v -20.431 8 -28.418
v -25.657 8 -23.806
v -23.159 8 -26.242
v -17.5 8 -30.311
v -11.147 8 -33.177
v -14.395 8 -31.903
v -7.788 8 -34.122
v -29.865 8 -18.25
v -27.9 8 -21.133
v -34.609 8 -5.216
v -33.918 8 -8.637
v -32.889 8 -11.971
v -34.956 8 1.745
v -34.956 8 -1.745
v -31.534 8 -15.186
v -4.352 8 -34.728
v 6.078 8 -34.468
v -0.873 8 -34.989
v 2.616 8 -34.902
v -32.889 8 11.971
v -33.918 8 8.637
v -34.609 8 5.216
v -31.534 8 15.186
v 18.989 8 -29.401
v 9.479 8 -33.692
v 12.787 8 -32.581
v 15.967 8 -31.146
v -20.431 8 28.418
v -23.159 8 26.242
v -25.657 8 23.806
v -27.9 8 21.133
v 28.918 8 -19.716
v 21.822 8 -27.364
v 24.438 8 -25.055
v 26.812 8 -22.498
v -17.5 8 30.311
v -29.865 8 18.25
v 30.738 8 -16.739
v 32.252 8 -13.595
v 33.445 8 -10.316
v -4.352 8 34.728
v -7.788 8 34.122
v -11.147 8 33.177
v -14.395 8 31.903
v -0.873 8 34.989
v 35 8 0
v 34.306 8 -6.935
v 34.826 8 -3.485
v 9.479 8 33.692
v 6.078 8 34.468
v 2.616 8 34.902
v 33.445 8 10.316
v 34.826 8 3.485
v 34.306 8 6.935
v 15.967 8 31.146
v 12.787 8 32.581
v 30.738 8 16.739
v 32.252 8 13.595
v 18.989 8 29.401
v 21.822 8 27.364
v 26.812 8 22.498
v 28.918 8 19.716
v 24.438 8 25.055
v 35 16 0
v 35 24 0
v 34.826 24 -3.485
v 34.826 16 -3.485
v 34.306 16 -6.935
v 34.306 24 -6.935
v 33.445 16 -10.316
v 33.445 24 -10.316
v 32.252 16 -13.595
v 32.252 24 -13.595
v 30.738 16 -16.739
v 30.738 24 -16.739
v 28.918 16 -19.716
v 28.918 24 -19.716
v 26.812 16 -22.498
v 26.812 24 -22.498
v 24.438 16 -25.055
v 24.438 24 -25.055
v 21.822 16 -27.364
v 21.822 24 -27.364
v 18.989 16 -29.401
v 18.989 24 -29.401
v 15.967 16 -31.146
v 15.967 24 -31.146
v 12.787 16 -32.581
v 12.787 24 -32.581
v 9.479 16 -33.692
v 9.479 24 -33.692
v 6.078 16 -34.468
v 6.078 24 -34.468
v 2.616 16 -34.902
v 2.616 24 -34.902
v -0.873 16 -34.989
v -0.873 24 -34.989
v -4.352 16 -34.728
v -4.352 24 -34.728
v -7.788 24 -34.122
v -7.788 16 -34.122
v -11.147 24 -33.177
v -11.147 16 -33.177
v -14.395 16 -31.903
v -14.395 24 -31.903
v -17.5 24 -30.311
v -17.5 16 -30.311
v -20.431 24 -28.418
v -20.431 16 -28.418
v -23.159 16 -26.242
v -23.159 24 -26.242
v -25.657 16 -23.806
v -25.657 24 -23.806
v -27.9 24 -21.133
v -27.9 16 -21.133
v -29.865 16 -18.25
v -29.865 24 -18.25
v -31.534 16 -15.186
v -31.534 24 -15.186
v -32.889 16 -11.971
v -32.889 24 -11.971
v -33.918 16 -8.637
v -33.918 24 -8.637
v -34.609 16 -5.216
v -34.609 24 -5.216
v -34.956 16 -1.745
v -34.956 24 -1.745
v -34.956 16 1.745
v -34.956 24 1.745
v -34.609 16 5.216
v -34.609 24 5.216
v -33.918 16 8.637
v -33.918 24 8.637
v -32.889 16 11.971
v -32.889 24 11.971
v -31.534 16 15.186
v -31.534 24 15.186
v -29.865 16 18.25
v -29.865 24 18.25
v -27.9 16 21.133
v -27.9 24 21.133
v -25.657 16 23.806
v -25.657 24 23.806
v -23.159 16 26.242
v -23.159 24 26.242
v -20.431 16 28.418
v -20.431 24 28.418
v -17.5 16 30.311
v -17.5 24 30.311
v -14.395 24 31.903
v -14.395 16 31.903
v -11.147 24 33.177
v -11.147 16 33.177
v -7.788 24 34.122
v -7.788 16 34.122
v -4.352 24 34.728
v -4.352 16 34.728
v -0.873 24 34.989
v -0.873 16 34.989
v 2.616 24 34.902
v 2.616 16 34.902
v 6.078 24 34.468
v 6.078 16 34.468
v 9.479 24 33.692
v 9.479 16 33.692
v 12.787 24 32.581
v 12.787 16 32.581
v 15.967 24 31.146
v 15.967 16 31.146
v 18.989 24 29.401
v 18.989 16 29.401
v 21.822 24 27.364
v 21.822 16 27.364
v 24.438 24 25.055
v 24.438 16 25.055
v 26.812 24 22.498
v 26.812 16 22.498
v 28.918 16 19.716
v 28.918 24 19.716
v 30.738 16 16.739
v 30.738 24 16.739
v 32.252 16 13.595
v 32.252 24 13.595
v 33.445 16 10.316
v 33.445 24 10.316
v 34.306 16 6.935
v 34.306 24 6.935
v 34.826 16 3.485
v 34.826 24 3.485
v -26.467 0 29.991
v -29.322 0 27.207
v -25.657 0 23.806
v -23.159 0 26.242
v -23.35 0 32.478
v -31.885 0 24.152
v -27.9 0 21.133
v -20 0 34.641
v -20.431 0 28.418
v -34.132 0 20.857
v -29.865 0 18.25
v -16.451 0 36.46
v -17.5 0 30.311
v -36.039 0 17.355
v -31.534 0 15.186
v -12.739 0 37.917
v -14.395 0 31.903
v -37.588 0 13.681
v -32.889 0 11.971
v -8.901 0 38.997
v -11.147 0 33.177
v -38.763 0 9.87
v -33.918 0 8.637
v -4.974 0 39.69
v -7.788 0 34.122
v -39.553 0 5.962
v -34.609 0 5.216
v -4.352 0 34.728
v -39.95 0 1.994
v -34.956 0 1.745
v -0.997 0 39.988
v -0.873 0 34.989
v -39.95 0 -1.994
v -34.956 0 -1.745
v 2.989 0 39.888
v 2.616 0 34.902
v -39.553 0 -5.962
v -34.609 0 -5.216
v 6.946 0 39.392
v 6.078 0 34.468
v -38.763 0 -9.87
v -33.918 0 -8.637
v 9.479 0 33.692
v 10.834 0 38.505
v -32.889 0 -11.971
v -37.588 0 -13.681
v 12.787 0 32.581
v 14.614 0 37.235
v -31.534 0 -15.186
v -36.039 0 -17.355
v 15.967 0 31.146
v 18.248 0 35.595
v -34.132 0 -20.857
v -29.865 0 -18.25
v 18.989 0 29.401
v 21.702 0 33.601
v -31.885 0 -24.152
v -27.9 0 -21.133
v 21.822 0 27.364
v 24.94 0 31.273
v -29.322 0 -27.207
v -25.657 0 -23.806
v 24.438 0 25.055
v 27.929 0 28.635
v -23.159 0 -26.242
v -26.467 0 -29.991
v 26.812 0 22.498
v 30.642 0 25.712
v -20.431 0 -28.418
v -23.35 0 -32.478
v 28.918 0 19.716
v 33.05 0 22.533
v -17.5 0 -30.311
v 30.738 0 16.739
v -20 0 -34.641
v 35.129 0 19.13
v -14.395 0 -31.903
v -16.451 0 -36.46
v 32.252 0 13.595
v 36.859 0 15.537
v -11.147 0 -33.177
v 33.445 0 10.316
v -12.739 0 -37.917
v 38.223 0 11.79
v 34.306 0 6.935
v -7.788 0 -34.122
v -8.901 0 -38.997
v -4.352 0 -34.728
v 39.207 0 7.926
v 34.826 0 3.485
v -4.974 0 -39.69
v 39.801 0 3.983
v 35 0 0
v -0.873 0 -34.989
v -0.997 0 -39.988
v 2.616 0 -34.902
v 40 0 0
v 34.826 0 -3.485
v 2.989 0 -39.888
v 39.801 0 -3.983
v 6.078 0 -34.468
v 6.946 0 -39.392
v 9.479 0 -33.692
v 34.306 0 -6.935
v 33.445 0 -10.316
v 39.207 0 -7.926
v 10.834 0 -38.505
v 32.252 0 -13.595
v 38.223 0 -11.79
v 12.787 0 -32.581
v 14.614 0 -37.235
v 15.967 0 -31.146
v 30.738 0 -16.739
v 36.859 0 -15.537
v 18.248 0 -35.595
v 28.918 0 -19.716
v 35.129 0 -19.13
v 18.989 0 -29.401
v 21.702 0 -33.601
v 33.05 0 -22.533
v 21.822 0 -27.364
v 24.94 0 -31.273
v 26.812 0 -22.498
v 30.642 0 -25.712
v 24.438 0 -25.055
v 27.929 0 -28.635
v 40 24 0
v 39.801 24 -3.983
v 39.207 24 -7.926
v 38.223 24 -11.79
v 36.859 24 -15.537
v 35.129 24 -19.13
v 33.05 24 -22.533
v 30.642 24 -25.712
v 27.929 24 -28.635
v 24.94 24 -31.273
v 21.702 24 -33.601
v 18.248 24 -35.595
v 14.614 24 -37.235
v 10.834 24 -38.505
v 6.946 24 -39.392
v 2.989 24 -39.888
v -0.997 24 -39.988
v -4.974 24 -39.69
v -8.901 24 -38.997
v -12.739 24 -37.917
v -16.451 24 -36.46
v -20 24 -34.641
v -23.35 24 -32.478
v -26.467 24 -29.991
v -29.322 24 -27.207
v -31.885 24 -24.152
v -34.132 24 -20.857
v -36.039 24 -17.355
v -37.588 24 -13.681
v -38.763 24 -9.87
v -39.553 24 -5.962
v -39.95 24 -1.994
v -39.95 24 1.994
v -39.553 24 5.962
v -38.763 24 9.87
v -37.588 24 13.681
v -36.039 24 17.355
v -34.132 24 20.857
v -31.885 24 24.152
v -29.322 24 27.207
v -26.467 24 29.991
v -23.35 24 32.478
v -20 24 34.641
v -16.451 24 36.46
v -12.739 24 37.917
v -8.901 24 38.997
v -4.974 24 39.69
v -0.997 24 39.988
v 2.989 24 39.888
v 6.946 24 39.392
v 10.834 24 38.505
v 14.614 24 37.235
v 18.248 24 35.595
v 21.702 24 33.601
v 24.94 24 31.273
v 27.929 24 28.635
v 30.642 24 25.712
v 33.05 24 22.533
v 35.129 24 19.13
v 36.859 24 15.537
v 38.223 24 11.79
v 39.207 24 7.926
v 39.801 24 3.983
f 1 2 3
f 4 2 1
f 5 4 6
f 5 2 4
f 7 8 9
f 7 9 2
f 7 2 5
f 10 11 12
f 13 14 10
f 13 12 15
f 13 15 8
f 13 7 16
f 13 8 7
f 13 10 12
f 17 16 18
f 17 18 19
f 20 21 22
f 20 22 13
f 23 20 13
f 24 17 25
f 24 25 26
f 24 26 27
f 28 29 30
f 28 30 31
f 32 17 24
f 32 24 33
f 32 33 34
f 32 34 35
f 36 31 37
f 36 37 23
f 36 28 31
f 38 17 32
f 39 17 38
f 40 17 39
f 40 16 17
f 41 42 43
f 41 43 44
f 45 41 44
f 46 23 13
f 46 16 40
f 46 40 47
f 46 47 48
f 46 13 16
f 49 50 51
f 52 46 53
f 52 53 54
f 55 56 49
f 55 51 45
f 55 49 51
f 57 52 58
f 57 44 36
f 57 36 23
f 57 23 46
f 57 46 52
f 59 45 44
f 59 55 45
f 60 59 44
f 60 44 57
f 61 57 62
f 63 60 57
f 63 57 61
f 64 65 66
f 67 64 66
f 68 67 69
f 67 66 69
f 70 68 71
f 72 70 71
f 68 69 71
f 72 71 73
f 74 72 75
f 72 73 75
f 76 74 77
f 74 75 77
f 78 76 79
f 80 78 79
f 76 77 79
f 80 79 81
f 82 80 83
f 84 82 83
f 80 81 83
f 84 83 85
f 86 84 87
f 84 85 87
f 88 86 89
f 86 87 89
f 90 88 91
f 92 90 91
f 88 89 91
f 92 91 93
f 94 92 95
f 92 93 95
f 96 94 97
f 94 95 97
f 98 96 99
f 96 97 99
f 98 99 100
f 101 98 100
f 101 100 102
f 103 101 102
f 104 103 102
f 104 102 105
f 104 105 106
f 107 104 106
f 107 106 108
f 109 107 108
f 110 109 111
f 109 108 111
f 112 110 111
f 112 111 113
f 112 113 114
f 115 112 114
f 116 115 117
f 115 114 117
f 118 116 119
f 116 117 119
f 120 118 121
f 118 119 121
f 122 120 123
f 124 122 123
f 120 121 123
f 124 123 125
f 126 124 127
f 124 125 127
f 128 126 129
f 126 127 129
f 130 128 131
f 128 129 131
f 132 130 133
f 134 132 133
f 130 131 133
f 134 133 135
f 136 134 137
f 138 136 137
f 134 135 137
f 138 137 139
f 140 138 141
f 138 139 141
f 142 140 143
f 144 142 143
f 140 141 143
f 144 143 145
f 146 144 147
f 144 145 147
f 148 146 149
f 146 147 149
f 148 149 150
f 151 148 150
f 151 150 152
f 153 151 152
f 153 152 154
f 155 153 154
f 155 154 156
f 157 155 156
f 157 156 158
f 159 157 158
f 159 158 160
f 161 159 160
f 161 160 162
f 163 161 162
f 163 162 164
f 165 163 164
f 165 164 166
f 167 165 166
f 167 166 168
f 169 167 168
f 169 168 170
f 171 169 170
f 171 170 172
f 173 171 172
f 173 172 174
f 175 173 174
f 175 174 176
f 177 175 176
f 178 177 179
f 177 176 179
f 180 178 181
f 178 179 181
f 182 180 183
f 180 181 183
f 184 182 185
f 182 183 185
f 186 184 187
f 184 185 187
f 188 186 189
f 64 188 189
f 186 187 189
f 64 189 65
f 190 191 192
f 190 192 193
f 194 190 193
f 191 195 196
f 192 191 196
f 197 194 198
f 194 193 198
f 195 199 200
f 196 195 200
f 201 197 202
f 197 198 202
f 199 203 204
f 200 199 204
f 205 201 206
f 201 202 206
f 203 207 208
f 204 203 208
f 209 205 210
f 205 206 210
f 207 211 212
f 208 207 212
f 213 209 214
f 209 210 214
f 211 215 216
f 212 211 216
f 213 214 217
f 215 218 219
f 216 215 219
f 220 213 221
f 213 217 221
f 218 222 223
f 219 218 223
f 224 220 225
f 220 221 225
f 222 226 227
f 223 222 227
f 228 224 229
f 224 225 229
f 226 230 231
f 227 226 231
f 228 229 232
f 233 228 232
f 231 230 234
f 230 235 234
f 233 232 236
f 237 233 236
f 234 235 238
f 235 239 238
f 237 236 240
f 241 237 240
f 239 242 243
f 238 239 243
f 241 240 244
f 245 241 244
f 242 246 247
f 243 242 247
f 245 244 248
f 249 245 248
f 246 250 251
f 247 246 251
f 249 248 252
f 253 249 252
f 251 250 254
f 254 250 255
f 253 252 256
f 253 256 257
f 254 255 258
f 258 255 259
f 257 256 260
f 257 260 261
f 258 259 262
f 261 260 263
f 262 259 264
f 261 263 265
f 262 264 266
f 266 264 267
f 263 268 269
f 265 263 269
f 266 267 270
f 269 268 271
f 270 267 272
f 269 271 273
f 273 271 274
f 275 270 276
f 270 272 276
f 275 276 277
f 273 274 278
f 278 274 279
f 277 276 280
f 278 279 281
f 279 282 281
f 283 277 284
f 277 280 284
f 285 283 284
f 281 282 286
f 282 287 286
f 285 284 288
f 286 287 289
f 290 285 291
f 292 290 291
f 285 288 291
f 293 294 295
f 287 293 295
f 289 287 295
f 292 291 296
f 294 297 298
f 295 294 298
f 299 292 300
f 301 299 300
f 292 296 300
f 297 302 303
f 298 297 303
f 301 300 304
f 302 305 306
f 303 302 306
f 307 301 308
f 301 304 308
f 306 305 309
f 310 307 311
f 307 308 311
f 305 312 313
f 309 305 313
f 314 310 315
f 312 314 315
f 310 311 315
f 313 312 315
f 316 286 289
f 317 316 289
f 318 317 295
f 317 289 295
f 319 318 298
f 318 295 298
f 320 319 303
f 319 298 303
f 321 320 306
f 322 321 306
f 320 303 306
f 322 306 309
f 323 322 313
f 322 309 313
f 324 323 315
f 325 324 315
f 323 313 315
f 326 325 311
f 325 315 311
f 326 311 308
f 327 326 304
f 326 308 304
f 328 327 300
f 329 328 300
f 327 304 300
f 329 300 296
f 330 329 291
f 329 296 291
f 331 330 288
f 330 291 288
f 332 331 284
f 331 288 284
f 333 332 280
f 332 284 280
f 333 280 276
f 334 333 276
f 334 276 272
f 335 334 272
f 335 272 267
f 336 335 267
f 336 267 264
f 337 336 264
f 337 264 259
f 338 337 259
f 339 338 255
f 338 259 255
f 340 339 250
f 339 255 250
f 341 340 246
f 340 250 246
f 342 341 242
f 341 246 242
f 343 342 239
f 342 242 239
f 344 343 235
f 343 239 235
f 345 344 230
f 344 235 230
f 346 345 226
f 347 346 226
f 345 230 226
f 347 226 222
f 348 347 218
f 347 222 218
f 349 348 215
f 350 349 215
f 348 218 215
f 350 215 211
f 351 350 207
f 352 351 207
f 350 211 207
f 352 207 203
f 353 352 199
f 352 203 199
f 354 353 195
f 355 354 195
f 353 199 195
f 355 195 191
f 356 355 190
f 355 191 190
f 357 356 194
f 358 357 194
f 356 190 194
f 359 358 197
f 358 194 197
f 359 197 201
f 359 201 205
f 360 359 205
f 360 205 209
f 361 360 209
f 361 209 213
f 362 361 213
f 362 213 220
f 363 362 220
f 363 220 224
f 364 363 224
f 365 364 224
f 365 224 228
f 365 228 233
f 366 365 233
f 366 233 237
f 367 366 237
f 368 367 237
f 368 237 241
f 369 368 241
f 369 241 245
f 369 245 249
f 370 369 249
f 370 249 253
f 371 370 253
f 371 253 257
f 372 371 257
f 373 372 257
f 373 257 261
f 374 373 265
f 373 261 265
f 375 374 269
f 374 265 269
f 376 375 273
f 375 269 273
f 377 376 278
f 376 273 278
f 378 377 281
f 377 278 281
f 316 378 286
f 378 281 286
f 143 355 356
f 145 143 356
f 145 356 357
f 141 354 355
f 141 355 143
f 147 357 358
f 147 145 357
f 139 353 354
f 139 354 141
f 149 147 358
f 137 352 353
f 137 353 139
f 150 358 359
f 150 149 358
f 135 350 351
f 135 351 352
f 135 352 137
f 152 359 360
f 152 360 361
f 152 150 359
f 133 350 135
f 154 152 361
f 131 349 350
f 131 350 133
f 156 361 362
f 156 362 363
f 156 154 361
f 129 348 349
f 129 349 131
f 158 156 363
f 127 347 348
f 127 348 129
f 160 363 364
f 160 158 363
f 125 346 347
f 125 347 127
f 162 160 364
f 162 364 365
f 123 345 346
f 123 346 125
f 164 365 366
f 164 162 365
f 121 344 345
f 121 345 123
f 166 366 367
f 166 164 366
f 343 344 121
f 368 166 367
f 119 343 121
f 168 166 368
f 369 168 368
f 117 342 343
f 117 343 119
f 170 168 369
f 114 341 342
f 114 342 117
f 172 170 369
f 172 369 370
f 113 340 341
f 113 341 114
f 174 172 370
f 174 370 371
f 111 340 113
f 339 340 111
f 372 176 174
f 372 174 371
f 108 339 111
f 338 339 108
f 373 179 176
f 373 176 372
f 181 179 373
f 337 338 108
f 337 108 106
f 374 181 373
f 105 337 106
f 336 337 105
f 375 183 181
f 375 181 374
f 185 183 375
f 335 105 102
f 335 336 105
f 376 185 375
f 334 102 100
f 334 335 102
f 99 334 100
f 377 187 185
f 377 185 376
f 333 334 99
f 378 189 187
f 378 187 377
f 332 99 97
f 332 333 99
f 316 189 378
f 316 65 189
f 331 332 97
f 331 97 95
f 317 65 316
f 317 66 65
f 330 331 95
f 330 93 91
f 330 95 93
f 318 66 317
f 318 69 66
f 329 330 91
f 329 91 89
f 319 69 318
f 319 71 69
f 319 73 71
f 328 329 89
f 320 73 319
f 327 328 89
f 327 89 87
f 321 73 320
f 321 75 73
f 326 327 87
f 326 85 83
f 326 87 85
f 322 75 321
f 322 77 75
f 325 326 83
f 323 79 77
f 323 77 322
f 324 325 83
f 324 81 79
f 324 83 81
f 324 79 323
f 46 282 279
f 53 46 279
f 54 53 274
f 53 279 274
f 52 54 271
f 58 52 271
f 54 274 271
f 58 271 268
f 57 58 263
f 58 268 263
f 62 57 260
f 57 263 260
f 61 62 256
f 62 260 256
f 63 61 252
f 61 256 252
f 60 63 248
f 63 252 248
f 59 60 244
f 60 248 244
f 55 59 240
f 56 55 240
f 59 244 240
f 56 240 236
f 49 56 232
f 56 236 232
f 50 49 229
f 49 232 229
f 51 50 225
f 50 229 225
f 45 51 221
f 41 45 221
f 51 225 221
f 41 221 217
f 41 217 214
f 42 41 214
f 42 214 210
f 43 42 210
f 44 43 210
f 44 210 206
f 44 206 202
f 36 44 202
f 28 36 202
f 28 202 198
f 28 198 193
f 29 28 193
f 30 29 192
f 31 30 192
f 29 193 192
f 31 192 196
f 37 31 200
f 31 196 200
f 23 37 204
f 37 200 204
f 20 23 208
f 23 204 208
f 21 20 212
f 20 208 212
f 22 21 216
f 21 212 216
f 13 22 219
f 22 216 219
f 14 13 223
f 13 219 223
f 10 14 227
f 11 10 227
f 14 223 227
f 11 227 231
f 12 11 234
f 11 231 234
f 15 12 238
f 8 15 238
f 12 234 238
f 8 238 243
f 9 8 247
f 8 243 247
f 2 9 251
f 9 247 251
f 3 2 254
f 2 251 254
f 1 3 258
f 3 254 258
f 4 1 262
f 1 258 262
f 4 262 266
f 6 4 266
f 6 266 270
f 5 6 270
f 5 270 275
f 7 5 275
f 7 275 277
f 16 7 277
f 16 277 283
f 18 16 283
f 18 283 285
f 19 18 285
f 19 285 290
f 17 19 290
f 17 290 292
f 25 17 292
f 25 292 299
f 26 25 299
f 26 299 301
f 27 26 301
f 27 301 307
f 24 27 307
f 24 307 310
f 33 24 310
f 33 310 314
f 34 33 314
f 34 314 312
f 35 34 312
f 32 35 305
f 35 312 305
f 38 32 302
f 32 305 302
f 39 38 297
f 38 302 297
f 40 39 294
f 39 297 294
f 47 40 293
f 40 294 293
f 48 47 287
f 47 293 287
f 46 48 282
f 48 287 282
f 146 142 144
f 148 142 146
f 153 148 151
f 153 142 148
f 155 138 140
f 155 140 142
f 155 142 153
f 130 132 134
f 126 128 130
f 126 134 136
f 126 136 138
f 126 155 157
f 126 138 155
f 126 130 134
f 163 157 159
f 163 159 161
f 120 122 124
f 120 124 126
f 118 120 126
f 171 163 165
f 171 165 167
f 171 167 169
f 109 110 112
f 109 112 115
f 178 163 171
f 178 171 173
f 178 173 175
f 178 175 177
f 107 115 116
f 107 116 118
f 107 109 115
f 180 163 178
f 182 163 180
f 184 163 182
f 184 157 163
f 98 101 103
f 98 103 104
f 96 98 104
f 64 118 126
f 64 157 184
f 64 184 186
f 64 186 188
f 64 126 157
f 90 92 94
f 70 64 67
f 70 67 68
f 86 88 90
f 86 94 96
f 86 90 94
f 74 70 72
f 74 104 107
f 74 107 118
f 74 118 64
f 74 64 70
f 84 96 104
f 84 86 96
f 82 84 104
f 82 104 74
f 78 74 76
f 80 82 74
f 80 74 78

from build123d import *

# Parameters (mm, degrees)
ESQUISSE1_R             = 40
BOSS_EXTRU_1_DEPTH      = 24
ESQUISSE2_R             = 35
ENL_V_MAT_EXTRU_1_DEPTH = 8
ESQUISSE3_R             = 35
ENL_V_MAT_EXTRU_2_DEPTH = 8


with BuildPart() as part:
    # Esquisse1 → Boss.-Extru.1 (new body)
    with BuildSketch(Plane(origin=(0, 0, 0), x_dir=(1, 0, 0), z_dir=(0, 1, 0))):
        Circle(ESQUISSE1_R)
    extrude(amount=BOSS_EXTRU_1_DEPTH)

    # Esquisse2 → Enlèv. mat.-Extru.1 (cut)
    with BuildSketch(Plane(origin=(0, 24, 0), x_dir=(1, 0, 0), z_dir=(0, 1, 0))):
        Circle(ESQUISSE2_R)
    extrude(amount=-ENL_V_MAT_EXTRU_1_DEPTH, mode=Mode.SUBTRACT)

    # Esquisse3 → Enlèv. mat.-Extru.2 (cut)
    with BuildSketch(Plane.XZ):
        Circle(ESQUISSE3_R)
    extrude(amount=-ENL_V_MAT_EXTRU_2_DEPTH, mode=Mode.SUBTRACT)


solid = part.part
